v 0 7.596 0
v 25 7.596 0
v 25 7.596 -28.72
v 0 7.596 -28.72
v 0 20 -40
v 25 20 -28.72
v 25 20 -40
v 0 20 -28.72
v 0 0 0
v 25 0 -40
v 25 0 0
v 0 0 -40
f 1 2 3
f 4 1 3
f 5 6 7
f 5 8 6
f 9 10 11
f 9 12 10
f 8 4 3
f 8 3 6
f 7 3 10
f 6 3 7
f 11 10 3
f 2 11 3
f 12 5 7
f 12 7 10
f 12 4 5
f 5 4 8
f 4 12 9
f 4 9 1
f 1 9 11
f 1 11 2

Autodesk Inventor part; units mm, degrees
ref_plane "YZ Plane" through (0, 0, 0) normal (1, 0, 0) x (0, 1, 0)
ref_plane "XZ Plane" through (0, 0, 0) normal (0, 1, 0) x (-1, 0, 0)
ref_plane "XY Plane" through (0, 0, 0) normal (0, 0, 1) x (1, 0, 0)
sketch "Esboço1" plane through (0, 0, 0) normal (1, 0, 0) x (0, 1, 0)
  line L0 (0, 0) -> (20, 0)
  line L1 (20, 0) -> (20, -40)
  line L2 (20, -40) -> (0, -40)
  line L3 (0, -40) -> (0, 0)
  dimension "d0" = 40
  dimension "d1" = 20
extrude "Extrusão1" add sketch "Esboço1" along normal blind 25
sketch "Esboço2" plane through (25, 0, 0) normal (1, 0, 0) x (0, 0, -1)
  line L0 (28.7205, 20) -> (-11.2795, 20)
  line L1 (-11.2795, 20) -> (-11.2795, 7.5964)
  line L2 (-11.2795, 7.5964) -> (28.7205, 7.5964)
  line L3 (28.7205, 7.5964) -> (28.7205, 20)
  line L4 (0, 0) -> (40, 0) projected
  dimension "d4" = 40
  dimension "d5" = 20
extrude "Extrusão2" cut sketch "Esboço2" against normal through all
properties part number "Peça_aula"
